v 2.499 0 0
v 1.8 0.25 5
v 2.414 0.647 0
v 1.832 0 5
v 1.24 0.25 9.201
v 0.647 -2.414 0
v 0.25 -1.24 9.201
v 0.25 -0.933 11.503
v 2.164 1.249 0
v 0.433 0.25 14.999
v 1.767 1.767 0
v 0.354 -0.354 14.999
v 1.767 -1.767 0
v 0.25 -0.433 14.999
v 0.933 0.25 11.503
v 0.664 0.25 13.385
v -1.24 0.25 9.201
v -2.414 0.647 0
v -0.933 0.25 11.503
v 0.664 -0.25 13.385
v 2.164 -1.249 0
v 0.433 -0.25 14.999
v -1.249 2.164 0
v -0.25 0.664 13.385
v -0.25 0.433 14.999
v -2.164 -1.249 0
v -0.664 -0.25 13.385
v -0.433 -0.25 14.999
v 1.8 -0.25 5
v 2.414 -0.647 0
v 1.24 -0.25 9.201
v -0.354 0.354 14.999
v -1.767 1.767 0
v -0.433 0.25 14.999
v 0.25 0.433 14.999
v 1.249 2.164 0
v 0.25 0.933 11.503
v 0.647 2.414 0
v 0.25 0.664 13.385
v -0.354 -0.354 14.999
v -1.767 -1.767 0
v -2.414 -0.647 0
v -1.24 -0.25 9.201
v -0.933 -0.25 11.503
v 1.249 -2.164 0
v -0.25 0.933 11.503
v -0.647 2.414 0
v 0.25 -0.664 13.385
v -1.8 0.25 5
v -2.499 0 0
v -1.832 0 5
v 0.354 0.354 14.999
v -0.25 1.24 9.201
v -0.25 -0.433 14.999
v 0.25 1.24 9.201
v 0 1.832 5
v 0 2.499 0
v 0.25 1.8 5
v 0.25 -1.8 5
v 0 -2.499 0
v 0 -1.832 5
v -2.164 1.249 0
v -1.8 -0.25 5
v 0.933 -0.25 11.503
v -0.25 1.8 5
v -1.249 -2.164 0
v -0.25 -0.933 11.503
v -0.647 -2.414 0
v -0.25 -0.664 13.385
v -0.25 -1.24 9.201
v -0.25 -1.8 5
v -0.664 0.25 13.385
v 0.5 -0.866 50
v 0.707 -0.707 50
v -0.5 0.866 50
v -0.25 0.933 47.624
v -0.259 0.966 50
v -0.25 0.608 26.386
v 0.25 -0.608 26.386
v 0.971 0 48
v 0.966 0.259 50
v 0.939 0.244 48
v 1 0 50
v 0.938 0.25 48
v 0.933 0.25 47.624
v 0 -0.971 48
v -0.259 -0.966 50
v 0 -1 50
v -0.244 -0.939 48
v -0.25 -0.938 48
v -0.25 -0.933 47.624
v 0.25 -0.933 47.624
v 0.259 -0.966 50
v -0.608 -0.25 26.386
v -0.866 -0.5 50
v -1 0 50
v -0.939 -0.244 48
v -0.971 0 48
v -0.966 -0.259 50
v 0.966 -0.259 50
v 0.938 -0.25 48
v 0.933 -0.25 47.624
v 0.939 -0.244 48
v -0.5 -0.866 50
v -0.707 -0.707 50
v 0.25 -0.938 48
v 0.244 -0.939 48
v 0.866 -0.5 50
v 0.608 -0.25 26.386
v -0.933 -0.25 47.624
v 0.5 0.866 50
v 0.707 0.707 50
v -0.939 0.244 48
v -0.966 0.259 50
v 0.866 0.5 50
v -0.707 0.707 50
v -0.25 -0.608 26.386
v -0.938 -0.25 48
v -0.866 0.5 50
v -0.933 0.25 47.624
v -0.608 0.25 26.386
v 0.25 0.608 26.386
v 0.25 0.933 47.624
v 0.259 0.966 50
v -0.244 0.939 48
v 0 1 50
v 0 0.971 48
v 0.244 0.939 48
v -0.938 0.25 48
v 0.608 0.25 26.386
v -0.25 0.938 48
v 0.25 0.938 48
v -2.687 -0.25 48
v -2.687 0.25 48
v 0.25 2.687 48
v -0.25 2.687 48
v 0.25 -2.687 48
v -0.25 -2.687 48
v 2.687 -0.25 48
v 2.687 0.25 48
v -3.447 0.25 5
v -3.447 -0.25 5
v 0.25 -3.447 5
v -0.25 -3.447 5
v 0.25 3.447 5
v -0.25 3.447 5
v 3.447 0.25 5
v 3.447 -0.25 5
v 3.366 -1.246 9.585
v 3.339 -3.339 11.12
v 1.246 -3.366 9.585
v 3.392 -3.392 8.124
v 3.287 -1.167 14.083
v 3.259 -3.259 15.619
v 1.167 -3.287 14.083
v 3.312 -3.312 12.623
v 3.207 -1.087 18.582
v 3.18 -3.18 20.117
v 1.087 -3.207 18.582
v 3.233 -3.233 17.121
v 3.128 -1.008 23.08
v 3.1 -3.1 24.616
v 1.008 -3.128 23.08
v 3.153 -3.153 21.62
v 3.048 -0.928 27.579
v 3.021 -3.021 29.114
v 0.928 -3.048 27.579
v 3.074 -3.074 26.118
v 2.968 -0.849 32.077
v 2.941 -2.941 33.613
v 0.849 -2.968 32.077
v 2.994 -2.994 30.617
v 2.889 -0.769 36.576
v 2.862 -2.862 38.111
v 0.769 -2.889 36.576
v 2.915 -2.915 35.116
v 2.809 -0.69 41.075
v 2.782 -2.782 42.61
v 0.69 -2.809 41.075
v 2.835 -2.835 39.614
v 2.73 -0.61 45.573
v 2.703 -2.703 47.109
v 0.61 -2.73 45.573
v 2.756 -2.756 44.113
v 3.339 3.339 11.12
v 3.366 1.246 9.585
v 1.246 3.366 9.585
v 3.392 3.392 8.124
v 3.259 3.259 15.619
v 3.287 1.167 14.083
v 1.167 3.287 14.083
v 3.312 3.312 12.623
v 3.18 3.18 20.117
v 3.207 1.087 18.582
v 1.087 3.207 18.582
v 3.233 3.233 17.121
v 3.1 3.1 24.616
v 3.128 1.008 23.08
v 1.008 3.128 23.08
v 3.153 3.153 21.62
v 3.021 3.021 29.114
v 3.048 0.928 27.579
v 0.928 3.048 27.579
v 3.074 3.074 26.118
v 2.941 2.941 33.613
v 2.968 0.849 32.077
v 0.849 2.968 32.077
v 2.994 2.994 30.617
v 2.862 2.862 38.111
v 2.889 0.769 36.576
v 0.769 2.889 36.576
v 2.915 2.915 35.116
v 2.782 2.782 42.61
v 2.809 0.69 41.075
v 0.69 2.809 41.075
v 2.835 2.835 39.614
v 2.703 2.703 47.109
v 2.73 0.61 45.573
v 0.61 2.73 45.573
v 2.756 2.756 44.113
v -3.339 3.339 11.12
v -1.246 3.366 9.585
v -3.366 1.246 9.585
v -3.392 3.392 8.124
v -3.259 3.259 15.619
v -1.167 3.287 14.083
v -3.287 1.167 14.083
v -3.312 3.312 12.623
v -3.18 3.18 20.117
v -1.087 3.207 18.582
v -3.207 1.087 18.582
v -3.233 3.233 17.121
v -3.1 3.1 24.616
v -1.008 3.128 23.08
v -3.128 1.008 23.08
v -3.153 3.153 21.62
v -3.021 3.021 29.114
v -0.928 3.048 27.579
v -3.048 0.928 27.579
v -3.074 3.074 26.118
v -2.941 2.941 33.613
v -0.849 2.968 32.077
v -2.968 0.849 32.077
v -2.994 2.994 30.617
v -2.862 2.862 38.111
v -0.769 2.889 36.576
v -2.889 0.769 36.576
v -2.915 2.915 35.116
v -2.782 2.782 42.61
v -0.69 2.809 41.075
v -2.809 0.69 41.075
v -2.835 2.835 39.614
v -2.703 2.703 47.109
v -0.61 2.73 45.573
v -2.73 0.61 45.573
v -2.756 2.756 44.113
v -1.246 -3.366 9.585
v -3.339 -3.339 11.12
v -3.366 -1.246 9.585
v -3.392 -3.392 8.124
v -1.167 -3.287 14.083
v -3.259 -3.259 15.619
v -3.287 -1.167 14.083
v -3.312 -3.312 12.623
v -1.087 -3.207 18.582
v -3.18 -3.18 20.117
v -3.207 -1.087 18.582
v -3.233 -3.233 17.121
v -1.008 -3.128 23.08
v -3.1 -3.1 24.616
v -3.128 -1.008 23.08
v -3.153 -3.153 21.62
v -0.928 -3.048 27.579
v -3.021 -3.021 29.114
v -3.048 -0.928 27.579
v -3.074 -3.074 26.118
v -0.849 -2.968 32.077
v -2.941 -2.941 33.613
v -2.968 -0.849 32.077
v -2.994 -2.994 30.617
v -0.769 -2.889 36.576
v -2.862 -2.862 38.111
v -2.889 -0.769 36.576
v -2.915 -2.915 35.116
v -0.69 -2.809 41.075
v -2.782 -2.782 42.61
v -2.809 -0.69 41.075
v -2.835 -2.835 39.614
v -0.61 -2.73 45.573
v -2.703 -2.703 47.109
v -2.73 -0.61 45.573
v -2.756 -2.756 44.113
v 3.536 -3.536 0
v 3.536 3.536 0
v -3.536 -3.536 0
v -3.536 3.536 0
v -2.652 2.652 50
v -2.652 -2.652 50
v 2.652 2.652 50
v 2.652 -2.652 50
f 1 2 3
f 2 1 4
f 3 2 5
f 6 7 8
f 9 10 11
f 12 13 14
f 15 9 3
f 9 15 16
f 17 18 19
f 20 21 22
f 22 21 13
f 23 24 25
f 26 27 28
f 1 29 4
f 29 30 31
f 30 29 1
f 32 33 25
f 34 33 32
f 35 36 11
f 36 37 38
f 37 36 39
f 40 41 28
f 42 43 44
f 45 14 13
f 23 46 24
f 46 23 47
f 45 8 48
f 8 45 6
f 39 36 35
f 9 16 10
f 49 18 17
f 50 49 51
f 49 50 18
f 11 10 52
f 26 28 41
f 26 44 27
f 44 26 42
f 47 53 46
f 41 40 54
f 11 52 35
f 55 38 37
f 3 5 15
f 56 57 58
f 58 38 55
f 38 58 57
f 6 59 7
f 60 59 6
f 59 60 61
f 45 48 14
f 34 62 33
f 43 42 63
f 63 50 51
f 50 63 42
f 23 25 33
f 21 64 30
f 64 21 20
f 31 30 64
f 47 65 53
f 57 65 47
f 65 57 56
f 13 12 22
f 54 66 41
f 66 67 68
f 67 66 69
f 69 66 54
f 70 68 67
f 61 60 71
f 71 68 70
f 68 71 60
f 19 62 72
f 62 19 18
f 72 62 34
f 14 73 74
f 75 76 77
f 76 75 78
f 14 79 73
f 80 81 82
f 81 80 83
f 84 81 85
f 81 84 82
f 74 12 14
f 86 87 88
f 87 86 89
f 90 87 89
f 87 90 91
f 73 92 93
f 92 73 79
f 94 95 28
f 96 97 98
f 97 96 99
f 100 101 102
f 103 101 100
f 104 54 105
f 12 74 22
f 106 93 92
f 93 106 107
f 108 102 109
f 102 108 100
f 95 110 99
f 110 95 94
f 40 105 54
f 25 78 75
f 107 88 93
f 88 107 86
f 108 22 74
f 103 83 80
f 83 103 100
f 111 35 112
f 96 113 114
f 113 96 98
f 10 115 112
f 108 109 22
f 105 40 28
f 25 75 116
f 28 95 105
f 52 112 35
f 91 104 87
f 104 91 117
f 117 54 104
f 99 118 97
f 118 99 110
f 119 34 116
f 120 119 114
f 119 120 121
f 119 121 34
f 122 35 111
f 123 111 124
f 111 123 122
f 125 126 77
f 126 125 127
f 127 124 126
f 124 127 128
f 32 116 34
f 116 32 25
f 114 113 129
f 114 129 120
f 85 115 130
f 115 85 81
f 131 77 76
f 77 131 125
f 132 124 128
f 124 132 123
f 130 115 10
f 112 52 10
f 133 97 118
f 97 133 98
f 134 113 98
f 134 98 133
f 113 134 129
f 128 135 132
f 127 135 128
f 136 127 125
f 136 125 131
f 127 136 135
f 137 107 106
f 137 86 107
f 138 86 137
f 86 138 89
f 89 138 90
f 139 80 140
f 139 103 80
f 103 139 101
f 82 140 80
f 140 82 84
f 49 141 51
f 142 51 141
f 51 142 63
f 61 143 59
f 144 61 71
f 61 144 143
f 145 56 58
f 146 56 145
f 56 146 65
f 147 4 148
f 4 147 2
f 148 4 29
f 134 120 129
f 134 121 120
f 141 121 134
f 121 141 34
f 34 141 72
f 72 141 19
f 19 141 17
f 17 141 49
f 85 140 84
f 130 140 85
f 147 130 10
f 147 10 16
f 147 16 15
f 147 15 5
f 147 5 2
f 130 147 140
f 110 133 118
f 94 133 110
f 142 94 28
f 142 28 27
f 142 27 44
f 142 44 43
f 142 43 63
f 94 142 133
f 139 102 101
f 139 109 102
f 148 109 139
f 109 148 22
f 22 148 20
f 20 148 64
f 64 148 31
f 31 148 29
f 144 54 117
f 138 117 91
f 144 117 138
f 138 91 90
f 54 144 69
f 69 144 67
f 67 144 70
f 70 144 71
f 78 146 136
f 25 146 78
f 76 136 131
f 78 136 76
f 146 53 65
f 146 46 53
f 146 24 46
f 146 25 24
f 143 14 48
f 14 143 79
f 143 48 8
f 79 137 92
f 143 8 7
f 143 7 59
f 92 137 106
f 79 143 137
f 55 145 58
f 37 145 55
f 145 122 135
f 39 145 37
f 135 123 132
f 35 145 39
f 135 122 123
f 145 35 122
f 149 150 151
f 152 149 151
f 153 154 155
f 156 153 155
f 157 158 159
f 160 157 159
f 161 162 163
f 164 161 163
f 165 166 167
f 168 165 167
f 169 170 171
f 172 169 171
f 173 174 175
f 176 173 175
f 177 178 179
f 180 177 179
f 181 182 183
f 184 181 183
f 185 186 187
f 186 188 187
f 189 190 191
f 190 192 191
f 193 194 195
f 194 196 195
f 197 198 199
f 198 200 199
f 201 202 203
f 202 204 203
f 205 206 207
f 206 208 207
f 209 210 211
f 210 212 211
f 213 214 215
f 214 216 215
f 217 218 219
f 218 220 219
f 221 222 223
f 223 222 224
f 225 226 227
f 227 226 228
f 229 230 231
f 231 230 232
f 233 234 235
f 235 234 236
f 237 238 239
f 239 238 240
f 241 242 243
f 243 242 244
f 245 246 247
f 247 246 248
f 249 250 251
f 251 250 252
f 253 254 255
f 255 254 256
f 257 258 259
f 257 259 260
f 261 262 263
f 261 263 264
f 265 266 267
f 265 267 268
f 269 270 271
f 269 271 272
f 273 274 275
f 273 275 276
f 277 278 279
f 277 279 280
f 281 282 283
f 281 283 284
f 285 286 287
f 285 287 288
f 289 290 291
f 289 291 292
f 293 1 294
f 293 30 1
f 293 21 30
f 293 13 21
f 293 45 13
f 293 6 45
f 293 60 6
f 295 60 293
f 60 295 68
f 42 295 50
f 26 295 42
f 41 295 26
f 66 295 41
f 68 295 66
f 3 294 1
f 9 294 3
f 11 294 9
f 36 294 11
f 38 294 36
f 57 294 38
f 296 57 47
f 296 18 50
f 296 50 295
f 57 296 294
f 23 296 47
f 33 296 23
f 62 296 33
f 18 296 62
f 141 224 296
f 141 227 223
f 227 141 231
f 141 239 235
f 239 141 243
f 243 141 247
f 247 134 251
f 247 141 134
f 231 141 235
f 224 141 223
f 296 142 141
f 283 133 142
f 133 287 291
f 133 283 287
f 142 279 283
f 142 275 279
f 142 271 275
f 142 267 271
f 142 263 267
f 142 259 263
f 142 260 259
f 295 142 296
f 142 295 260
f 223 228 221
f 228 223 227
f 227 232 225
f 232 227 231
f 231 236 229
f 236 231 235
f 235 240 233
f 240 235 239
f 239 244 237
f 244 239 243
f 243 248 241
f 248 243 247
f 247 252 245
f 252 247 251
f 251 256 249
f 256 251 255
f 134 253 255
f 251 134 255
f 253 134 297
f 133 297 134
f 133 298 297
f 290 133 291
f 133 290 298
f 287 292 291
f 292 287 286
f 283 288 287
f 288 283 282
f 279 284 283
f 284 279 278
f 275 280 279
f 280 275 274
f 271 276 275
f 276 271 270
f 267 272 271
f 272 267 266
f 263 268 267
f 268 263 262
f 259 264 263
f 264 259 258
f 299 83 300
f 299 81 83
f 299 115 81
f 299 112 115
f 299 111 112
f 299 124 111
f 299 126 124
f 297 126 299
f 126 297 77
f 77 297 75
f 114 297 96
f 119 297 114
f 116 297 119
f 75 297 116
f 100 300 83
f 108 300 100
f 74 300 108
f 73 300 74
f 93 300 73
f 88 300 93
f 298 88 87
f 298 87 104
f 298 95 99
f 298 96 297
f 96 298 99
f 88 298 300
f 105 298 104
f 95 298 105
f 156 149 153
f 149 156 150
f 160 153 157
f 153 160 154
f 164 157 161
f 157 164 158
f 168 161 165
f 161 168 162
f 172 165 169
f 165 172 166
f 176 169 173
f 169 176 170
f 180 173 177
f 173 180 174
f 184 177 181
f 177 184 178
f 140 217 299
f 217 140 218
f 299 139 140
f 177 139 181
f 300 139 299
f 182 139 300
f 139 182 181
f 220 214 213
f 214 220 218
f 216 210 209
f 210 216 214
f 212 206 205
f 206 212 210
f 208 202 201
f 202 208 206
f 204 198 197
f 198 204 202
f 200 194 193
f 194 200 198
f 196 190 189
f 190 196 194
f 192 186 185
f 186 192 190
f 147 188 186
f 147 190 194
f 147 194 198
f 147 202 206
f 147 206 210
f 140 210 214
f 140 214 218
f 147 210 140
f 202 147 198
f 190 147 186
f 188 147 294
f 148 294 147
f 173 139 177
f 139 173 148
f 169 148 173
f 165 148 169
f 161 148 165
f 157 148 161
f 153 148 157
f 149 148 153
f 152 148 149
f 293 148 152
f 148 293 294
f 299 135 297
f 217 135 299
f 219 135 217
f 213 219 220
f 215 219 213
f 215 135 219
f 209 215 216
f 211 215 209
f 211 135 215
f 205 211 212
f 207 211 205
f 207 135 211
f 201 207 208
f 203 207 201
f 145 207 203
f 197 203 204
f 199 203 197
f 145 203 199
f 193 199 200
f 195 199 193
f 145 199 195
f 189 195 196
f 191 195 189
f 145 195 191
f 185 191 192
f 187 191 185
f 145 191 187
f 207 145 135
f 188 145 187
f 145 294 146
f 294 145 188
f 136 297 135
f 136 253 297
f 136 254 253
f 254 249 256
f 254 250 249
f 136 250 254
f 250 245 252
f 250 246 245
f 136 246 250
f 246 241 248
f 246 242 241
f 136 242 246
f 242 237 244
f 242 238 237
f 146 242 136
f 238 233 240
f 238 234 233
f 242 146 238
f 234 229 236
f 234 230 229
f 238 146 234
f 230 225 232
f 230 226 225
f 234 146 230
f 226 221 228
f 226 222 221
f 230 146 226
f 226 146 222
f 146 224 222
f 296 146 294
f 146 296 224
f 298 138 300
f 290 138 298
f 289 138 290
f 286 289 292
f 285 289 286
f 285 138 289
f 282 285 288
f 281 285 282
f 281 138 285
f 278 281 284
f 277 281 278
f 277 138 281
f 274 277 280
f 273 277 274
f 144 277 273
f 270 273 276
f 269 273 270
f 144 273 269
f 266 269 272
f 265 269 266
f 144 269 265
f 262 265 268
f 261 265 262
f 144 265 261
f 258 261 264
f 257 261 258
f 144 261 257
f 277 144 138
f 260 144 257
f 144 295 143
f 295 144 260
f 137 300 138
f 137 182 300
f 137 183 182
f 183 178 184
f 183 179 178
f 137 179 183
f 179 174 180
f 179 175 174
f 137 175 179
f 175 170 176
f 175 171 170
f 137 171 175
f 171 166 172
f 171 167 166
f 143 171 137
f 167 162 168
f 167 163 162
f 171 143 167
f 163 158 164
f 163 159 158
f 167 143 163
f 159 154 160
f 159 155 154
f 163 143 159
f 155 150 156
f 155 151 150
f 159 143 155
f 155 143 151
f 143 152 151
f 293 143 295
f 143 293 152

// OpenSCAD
// a special wall anchor with lost of adjustments
// (all sizes in millimenter)

module wall_anchor(
    drill_hole_dm = 8,  // drill hole diameter
    screw_dm = 5,       // screw diameter
    length = 50,     // anchor length
    oversize = 2,   // outer diameter oversize
    outer_taper = 0.75,     // outer taper factor
    inner_taper = 0.2,      // inner taper factore
    inner_taper_end = 0.3,   // relative end of inner tape along length
    collar = 0.1,   // relative length of initial non-slit part
    slit = 0.5,     // slit width
    cap_size = 2,    // length of the end up,
    teeth_div = 5,  // divisor determining the number of teeth
    teeth_depth = 1.5   // depth of the teeth
) {
    
    difference() {
            
        outer_dm = drill_hole_dm + oversize;
        side_length = sqrt( pow(outer_dm, 2 ) / 2 );
        
        linear_extrude( height = length, scale = outer_taper )
           square( side_length, center = true);
            
        // hole
        abs_taper_end = length * inner_taper_end;
        taper_dm = screw_dm * inner_taper;
        
        translate( [0,0,-0.01])
        union() {
            $fn = 24;
            
            cylinder(d1 = screw_dm, d2 = taper_dm, h = abs_taper_end + 0.01);
            
            translate( [ 0, 0, abs_taper_end ])
            cylinder(d1 = taper_dm, h = length - abs_taper_end + 0.02);
        }
        
        // slits
        abs_collar = length * collar;
        
        for (i = [0:1])
            rotate( [ 0, 0, i * 90])
            translate([
                -(side_length + 2) / 2,
                -slit / 2,
                abs_collar
            ])
            cube ([
                side_length + 2,
                slit,
                length - cap_size - abs_collar
        ]);
        
        // teeth
        teeth_count = floor ( (length - abs_collar) / teeth_div );
//        echo((length - abs_collar) / teeth_div );
//        echo(teeth_count);
        teeth_dist = (length - abs_collar) / (teeth_count + 1);
        
        opposite = (outer_dm - (outer_dm * outer_taper)) / 2;
        hypotenuse = sqrt( pow(opposite, 2) + pow(length, 2));
        angle = asin( opposite / hypotenuse );
        
        diag_dist = sqrt( pow(outer_dm/2 - teeth_depth, 2) / 2 );
        
        for (j = [0:90:359])
        rotate( [0, 0, j])
        rotate( -angle, [1,1,0])
        for (i = [1:1:teeth_count] )
        translate( [diag_dist, -diag_dist, abs_collar + i * teeth_dist] )
        rotate([0,0,-45])
        translate(  [0, -outer_dm / 2, 0 ] )
        rotate([0,45,0])
        cube( outer_dm );
    }
}

wall_anchor();
